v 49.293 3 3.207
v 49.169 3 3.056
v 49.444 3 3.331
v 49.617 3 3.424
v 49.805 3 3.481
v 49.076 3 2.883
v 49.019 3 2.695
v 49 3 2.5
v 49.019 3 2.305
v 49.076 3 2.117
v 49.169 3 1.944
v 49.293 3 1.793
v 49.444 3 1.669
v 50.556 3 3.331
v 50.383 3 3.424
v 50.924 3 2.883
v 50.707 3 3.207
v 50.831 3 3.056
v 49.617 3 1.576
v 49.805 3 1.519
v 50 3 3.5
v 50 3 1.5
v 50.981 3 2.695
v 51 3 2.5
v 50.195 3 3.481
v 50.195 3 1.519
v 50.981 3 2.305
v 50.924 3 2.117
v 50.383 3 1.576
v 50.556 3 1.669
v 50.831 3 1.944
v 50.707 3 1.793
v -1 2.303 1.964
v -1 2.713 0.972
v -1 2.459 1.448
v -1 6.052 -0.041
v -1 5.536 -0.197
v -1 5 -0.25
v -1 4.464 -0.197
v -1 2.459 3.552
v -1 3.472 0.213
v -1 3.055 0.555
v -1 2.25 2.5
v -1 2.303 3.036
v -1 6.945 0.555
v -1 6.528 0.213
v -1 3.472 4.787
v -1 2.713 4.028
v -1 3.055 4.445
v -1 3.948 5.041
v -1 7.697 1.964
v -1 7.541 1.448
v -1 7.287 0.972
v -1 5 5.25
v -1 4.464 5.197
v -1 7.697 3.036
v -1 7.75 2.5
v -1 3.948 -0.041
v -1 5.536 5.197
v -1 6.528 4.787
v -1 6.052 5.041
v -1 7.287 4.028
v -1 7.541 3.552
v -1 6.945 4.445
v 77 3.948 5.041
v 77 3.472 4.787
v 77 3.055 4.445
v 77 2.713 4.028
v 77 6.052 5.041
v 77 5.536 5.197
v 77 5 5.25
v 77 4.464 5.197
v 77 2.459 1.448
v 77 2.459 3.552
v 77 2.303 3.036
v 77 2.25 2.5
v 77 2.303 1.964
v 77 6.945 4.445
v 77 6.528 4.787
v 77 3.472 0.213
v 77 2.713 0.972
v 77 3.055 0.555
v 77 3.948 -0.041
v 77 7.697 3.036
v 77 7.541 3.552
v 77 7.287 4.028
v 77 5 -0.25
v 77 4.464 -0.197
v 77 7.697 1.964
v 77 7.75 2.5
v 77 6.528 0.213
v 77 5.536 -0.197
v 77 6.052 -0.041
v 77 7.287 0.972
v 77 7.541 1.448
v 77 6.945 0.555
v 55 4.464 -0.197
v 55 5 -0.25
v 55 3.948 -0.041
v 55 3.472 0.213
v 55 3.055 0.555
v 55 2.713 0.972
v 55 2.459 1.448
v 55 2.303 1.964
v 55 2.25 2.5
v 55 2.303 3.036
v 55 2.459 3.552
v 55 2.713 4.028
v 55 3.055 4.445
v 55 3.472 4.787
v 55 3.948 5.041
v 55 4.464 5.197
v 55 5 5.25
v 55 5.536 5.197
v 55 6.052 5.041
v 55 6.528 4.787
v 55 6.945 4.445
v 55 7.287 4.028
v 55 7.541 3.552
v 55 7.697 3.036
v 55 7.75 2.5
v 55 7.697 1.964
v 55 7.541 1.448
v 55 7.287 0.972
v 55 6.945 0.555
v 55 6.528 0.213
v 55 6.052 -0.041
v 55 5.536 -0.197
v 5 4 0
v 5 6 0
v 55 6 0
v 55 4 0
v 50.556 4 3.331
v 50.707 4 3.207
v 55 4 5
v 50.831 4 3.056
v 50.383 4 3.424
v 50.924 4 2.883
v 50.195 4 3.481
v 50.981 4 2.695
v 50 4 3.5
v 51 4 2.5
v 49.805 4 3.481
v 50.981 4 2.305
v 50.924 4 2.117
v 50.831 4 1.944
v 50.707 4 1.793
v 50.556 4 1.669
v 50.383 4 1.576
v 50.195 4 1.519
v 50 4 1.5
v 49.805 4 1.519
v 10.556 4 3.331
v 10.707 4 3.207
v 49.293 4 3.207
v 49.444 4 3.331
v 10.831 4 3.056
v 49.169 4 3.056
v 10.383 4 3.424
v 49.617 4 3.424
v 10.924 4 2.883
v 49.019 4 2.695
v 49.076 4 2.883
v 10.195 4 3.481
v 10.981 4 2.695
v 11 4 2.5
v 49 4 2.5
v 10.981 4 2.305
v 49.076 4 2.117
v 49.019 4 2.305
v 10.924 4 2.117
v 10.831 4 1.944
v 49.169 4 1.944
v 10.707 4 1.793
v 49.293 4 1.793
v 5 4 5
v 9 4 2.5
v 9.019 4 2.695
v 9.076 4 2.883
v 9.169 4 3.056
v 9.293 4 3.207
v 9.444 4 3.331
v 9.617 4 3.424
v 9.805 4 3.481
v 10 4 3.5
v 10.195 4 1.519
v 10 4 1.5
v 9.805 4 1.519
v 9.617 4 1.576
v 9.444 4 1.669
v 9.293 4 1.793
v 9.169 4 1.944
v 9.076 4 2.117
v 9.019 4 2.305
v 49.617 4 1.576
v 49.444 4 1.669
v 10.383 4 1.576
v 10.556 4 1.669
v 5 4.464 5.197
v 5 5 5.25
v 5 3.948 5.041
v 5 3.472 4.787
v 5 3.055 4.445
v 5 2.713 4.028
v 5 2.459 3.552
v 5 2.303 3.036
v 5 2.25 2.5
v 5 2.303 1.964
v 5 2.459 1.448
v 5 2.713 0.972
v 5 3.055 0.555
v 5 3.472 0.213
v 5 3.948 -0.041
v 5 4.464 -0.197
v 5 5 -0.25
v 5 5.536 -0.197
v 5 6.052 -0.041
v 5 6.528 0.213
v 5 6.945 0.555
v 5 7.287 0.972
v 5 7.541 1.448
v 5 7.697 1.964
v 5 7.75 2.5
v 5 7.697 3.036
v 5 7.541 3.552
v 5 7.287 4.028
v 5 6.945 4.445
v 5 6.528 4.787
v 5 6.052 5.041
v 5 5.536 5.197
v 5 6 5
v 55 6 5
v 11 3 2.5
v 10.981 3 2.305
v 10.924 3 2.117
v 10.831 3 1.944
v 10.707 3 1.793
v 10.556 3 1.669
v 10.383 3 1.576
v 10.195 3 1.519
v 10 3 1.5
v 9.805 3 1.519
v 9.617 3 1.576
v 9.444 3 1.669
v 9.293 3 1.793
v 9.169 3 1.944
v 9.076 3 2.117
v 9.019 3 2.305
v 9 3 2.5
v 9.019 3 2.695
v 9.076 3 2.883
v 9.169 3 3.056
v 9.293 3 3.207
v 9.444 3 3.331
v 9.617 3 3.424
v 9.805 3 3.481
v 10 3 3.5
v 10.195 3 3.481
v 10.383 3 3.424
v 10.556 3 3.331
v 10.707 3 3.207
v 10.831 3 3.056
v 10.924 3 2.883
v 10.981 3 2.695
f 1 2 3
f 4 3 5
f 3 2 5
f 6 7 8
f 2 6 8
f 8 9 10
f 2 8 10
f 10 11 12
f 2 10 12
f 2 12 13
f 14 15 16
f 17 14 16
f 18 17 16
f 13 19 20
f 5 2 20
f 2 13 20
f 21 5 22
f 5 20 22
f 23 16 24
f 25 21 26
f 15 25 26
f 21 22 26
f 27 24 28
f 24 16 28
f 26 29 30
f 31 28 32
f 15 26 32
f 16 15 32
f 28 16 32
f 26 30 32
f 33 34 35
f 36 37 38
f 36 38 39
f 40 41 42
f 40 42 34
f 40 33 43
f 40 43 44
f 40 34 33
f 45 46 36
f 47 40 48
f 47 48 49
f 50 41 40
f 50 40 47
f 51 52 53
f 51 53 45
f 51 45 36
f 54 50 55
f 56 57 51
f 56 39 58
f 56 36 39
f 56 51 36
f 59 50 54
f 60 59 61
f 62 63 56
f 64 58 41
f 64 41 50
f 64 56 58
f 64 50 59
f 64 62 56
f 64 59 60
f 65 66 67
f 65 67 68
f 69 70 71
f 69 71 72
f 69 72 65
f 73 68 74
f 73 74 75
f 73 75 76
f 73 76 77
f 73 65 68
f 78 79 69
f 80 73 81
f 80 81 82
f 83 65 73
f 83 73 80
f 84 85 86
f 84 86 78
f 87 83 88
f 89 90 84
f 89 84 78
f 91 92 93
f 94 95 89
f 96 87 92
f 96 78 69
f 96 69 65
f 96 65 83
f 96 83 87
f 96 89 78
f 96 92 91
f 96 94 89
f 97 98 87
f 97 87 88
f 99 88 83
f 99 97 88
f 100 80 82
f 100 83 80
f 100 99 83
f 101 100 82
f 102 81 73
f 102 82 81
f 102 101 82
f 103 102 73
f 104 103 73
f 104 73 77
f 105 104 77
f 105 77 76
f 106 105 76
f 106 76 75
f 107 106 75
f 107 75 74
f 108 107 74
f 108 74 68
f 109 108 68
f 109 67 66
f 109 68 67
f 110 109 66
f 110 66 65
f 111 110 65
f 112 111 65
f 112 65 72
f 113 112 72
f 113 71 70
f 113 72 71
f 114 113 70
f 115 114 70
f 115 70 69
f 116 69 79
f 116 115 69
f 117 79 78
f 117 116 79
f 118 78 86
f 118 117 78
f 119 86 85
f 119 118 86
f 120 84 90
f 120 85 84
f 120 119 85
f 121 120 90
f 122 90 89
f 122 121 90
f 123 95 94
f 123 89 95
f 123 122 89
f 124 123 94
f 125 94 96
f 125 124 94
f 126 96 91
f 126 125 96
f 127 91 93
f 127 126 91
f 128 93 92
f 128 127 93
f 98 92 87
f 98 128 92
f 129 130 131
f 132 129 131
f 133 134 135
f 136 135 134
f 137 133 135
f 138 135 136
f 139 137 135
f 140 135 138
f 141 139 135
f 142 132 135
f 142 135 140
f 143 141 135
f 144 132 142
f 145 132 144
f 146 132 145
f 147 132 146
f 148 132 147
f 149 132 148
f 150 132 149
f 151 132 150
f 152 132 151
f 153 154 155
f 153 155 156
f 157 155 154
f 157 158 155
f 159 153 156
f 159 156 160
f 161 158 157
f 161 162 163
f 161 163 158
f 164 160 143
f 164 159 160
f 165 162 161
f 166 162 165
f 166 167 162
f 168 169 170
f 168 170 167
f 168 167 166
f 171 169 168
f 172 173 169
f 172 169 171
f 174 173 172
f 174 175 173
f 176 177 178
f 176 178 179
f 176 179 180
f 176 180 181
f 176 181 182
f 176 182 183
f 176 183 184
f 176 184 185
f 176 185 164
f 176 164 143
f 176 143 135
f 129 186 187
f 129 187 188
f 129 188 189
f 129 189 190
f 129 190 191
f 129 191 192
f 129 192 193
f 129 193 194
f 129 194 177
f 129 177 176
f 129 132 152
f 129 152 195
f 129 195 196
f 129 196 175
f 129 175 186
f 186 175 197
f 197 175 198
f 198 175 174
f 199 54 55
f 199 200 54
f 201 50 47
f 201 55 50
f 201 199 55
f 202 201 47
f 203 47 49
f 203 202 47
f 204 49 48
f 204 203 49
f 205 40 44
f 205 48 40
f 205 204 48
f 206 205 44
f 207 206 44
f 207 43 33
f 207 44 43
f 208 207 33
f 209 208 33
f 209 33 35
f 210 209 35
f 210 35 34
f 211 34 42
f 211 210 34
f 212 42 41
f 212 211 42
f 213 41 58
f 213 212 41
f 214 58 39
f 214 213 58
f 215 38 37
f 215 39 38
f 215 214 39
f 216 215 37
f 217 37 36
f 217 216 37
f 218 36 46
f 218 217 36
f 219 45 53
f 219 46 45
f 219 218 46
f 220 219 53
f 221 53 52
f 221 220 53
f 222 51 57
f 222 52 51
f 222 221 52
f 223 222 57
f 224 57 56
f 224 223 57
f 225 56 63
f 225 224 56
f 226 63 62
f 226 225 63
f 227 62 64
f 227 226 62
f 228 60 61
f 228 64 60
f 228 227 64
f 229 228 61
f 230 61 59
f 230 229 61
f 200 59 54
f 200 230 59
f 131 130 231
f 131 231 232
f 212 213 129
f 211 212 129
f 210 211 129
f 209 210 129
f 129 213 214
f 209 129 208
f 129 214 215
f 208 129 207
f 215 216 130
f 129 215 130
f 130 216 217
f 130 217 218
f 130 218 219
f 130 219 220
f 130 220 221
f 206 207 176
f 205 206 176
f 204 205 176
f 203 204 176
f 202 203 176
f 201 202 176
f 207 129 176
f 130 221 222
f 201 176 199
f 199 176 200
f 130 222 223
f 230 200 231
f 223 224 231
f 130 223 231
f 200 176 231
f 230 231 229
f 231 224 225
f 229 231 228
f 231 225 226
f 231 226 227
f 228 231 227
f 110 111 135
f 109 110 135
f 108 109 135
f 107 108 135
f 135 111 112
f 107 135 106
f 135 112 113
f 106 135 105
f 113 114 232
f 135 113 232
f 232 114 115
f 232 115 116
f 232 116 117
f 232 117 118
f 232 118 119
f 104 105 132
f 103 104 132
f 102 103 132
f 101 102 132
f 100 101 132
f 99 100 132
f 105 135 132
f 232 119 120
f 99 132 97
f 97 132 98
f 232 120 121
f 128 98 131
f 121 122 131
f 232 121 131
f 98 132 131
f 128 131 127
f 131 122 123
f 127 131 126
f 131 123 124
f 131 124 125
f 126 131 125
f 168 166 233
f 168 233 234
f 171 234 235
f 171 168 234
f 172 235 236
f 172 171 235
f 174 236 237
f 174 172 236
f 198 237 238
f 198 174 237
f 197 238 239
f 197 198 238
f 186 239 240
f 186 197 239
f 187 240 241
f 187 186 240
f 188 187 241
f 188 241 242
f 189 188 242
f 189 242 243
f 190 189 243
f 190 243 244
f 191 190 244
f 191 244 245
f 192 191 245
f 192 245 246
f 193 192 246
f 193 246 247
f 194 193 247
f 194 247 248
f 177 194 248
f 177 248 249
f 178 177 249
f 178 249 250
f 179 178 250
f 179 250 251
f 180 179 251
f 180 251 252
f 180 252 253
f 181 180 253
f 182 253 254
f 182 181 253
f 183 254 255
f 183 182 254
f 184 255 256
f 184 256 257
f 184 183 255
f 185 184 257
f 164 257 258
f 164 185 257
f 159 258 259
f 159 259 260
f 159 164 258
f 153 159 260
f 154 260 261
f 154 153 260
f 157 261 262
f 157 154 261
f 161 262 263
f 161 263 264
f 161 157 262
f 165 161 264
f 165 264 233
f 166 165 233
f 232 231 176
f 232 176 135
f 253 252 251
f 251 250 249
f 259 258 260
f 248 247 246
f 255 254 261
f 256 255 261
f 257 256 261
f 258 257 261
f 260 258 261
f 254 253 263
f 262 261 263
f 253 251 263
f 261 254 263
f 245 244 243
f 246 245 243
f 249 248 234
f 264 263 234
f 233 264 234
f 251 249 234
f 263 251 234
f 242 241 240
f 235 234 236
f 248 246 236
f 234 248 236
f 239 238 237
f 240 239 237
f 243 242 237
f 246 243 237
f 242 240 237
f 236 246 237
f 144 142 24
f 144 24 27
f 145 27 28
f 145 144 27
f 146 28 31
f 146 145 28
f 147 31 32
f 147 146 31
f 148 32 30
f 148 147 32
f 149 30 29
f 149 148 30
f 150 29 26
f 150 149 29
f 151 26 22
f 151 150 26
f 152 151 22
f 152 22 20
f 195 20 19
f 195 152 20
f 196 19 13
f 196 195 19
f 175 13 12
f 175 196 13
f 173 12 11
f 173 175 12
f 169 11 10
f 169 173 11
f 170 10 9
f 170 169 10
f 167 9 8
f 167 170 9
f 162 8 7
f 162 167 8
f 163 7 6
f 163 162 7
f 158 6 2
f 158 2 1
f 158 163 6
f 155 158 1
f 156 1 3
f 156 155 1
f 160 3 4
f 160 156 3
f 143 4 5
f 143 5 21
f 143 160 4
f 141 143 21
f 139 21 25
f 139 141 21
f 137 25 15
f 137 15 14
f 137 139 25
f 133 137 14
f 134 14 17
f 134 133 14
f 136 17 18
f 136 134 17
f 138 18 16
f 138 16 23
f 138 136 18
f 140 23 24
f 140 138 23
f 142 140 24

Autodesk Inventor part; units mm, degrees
ref_plane "YZ Plane" through (0, 0, 0) normal (1, 0, 0) x (0, 1, 0)
ref_plane "XZ Plane" through (0, 0, 0) normal (0, 1, 0) x (-1, 0, 0)
ref_plane "XY Plane" through (0, 0, 0) normal (0, 0, 1) x (1, 0, 0)
sketch "Esquisse1" plane through (0, 0, 0) normal (0, 0, 1) x (1, 0, 0)
  line L0 (0, 10) -> (5, 10)
  line L1 (5, 6) -> (5, 10)
  line L2 (5, 6) -> (55, 6)
  line L3 (55, 6) -> (55, 10)
  line L4 (55, 0) -> (55, 4)
  line L5 (55, 4) -> (5, 4)
  line L6 (5, 6) -> (5, 4)
  line L7 (55, 6) -> (55, 4)
  point P0 (0, 0)
  point P1 (25, 10)
  dimension "d39" = 50
  dimension "d40" = 5
extrude "Extrusion1" add sketch "Esquisse1" along normal blind 5
sketch "Esquisse9" plane through (5, 6, 0) normal (0, 1, 0) x (1, 0, 0)
  line L0 (0, 0) -> (5, 0)
  line L1 (5, 0) -> (45, 0)
  line L2 (0, 0) -> (50, 0) projected
  line L3 (45, 0) -> (45, -2.5)
  line L4 (5, 0) -> (5, -2.5)
  circle A0 centre (5, -2.5) radius 1
  circle A1 centre (45, -2.5) radius 1
  point P0 (-5, 0)
  dimension "d42" = 5
  dimension "d43" = 40
  dimension "d44" = 2
  dimension "d45" = 2
extrude "Extrusion9" add sketch "Esquisse9" against normal blind 3
sketch "Esquisse10" plane through (55, 4, 0) normal (1, 0, 0) x (0, 0, -1)
  line L0 (0, 0) -> (0, 2) projected
  line L1 (0, 1) -> (-5, 1)
  line L2 (-5, 0) -> (-5, 2) projected
  circle A0 centre (-2.5, 1) radius 2.75
  point P0 (0, -4)
  dimension "d50" = 5.5
extrude "Extrusion10" add sketch "Esquisse10" along normal blind 22
sketch "Esquisse11" plane through (5, 4, 0) normal (-1, 0, 0) x (0, 0, 1)
  circle A0 centre (2.5, 1) radius 2.75 projected
  circle A1 centre (2.5, 1) radius 2.75
  point P0 (0, -4)
extrude "Extrusion11" add sketch "Esquisse11" along normal blind 6
properties part number "Cheville"
